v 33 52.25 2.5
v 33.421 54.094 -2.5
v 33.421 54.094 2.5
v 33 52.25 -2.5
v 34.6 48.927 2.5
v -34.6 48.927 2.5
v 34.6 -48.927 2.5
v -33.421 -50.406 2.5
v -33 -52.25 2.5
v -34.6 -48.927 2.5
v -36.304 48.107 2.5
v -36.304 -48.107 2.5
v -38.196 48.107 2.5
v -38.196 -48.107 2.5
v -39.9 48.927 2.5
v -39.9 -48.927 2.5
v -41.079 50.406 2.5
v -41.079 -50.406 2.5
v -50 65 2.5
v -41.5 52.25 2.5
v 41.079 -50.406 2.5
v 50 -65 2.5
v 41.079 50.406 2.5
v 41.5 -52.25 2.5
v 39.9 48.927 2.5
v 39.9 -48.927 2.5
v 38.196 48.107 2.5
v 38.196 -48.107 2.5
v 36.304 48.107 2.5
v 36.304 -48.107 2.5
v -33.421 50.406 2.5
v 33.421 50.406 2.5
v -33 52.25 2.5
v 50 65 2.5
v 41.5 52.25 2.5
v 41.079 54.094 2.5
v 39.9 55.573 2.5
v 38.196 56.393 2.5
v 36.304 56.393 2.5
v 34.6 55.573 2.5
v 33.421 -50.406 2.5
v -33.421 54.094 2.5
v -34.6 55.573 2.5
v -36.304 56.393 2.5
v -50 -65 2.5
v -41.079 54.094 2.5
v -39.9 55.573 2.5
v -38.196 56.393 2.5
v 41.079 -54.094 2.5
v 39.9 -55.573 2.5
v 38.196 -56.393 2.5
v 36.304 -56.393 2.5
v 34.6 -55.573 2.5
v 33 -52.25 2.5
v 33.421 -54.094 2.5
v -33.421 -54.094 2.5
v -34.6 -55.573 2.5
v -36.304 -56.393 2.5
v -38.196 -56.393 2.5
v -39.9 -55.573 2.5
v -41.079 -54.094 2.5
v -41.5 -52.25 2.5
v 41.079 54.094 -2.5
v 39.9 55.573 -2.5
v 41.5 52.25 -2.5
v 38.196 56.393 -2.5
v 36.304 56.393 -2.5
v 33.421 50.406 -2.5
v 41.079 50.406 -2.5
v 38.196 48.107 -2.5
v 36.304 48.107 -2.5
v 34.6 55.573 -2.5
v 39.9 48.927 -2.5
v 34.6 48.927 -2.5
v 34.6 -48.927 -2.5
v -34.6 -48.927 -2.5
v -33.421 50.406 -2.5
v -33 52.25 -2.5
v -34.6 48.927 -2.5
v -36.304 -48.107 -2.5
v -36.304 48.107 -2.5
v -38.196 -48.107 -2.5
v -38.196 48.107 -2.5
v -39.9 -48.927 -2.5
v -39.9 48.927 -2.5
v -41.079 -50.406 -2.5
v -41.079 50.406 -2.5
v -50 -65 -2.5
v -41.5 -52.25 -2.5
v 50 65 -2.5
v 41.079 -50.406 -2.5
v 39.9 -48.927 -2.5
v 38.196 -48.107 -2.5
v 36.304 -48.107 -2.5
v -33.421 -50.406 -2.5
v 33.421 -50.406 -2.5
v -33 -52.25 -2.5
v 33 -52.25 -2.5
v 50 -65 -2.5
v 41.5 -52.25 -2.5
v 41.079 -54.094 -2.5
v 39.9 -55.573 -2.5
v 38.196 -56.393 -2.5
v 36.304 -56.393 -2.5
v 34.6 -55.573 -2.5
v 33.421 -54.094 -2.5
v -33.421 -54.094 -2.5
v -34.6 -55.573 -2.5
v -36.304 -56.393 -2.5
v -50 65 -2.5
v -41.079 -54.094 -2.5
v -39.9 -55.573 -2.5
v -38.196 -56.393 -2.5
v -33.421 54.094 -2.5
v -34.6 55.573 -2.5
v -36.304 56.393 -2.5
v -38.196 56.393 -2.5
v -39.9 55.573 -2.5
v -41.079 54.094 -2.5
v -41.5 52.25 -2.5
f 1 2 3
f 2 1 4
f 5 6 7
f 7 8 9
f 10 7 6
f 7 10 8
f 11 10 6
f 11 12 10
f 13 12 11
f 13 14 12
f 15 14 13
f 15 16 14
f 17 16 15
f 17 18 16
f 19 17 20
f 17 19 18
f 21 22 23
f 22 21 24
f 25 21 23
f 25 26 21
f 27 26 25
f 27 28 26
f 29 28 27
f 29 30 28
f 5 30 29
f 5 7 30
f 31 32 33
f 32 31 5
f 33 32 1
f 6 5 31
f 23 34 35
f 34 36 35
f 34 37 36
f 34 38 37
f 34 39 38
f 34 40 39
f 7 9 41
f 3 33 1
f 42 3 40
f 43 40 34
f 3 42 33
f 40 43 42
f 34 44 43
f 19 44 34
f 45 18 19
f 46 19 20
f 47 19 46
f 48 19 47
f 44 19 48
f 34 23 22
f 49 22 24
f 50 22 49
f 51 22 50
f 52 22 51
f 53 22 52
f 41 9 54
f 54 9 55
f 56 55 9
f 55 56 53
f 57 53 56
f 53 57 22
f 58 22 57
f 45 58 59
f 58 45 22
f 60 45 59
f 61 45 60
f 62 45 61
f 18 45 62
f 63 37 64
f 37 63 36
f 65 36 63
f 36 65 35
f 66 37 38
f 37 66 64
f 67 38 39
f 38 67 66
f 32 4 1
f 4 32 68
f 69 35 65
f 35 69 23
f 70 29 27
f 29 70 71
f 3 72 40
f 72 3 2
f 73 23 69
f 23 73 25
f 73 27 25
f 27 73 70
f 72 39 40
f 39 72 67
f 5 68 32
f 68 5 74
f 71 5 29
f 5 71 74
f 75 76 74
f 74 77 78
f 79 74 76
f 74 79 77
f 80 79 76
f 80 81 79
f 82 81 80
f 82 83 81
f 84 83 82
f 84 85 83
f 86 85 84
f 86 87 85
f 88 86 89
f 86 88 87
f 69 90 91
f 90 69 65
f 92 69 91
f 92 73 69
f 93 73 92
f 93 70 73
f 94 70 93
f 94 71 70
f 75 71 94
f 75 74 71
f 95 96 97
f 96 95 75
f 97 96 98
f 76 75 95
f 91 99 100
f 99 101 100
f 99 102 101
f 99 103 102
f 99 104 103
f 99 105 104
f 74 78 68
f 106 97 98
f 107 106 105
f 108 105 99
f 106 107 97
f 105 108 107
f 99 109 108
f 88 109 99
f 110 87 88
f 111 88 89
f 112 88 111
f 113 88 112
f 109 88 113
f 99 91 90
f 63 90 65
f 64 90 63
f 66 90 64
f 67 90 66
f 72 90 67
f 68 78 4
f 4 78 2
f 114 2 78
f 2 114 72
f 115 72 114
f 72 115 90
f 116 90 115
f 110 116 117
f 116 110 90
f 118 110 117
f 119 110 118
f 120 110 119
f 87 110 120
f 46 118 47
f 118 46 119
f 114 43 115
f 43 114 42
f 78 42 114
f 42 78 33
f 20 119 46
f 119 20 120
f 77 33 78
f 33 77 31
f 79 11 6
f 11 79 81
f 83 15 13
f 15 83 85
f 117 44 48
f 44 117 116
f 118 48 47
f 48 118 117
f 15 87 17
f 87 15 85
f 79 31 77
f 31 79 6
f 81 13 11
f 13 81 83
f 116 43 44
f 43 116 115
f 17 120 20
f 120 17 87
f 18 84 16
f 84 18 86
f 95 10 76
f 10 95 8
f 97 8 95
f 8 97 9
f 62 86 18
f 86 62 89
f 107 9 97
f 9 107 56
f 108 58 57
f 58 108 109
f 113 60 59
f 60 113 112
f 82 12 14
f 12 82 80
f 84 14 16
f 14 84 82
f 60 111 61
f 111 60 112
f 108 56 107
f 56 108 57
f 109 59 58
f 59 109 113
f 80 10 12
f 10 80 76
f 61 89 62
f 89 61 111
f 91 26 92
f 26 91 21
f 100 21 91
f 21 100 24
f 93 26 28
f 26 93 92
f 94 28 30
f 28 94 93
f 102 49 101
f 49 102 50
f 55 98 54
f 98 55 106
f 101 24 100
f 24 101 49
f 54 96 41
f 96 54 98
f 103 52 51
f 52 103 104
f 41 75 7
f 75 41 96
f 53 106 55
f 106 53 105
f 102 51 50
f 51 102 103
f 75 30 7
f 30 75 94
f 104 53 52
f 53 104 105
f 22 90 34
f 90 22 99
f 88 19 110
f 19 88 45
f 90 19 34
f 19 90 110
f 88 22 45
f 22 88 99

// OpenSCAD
// Generated by SolidPython 1.1.3 on 2023-10-12 11:56:06


difference() {
	cube(center = true, size = [100, 130.0000000000, 5]);
	union() {
		translate(v = [37.2500000000, 52.2500000000]) {
			cylinder(center = true, h = 5, r = 4.2500000000);
		}
		translate(v = [-37.2500000000, 52.2500000000]) {
			cylinder(center = true, h = 5, r = 4.2500000000);
		}
		translate(v = [-37.2500000000, -52.2500000000]) {
			cylinder(center = true, h = 5, r = 4.2500000000);
		}
		translate(v = [37.2500000000, -52.2500000000]) {
			cylinder(center = true, h = 5, r = 4.2500000000);
		}
	}
}
/***********************************************
*********      SolidPython code:      **********
************************************************
 
import solid
import numbers
import pudb
from solid.utils import *
import viewscad
import subprocess
import os
import os.path as osp
import math
import sys

chamfer_extrude=solid.import_scad("./chamfer_extrude.scad")
chamfer_extrude=chamfer_extrude.chamfer_extrude
r = viewscad.Renderer(width=800, height=800)

def debug(model,f_name,path="/home/ts/code/projects/mfd/designs/debug"):
    solid.scad_render_to_file(model,osp.join(path,f_name)+".scad")
#generate position list of wells using offset from center
wells_pos_from_center_4 = lambda offset: [[-offset,offset],
                                        [offset, offset],
                                        [-offset, -offset],
                                        [offset, -offset]]
#wells_pos_from_center_2 = lambda offset: [[0,offset],
#                                        [0, -offset]]
wells_pos_from_center_2 = lambda offset: [[offset,0],
                                        [-offset,0]]

def make_well(dims,shape=None,height=None,dxf=False):
    def circle_cylinder():
        if dxf or (height is None):
            well = solid.circle(r=dims, segments=64)
        else:
            well = solid.cylinder(r=dims, h=height, segments=64, center = True)
        return well
    if dims is None:
        sys.exit("radius needs to be a number")
    if isinstance(dims, numbers.Number):
        well =circle_cylinder()
    elif len(dims)==1:
        if isinstance(dims[1], numbers.Number):
            well =circle_cylinder()
        else:
            sys.exit("radius needs to be a number")
    elif len(dims)==2:
        well = solid.square(dims,center = True)
    elif len(dims)==3:
        well = solid.cube(dims, center = True)
    return well

def wells_top_bottom(center_gap,device_dims=None,shape=None,height=None, positions = None, dxf = False):
    well_shape = make_well(device_dims,shape=shape,height=height,dxf=dxf)
    wells = []
    if positions is None:
        offset = radius+radius/2.0
        positions = wells_pos_from_center_2(offset)
    if dxf or (height is None):
        height = 0
    for position in positions:
        if dxf:
            wells.append(solid.translate([position[0],position[1]])(well_shape))
        else:
            wells.append(solid.translate([position[0],position[1],height/2.0])(well_shape))
    return  union()(*wells)

#place wells in four corners 
def four_corner(radius,height=None, positions = None, dxf = False):
    #if well pos not specified set
    #to equally spaced by half radius
    if positions is None:
        offset = radius+radius/2.0
        positions = wells_pos_from_center_4(offset)
    if dxf or (height is None):
        height = 0
    #make wells at positions with specified radius and height
    wells = []
    for position in positions:
        #make circle if making dxf
        if dxf:
            well_shape = solid.circle(r=radius, segments=64)
            well_shape = solid.translate([position[0],position[1]])(well_shape)
        #if stl make cylinder
        else:
            well_shape = solid.cylinder(r=radius, h=height, segments=64, center = True)
            well_shape = solid.translate([position[0],position[1],height/2.0])(well_shape)
        wells.append(well_shape)
    return  union()(*wells)

#generate channels 
def make_channels(length,width,height=0,num_chans=1,max_chans=None,spacing=None, dxf = False,
                  rotate_channels=False):
    if dxf or (height is None):
        height = 0
    #if channel gap not defined, is equal to
    if spacing is None: spacing = width
    #calculate number of channels if fitting max num within given width
    if not max_chans is None:
        import math
        num_chans = math.floor((max_chans-spacing)/(width+spacing))
    #get total width of channel section  
    total_width = (width*num_chans)+(spacing*(num_chans-1))

    #make template channel
    #if rotate_channels: width, length = length, width
    if dxf:
        channel_t = solid.square([length,width],center = True)
    else:
        channel_t = solid.cube([length,width,height], center = True)

    #if number channels is even, offset the first channel to center its gap
    if num_chans % 2 == 0: centering = -(width/2.0+spacing/2.0)
    else: centering = 0
    #move template channel up to align bottom at z = 0 
    #and offset center if necessary
    if dxf:
        channel_t = solid.translate([0,centering])(channel_t)
    else:
        channel_t = solid.translate([0,centering,height/2.0])(channel_t)

    #if rotate_channels: length,width = width,length
    #start making the channels
    channels = []
    for i in range(num_chans):
        #if i=0 there is no translation
        #if i=1, we make the first channel adjacent to second
        direction = i

        #if i>=1, we add channels alternating left and right
        if i >= 1:
            direction = -(i/2.0)
            if i % 2 == 1: direction = (-direction)+0.5
                
        #make channel at right position and add it to channel list
        translation_coords = [0,direction*(width+spacing)]
        #if rotate_channels: translation_coords = [direction*(width+spacing),0]
        if dxf:
            channel = solid.translate(translation_coords)(channel_t)
        else:
            channel = solid.translate([*translation_coords,0])(channel_t)
        channels.append(channel)
    
    #group all channels as one object
    channels = union()(*channels)
    #compute the x,y,z dimensions in order to pass as arguments 
    #for construction of other parts of device (such as the chambers)
    measurements = {'x':(length/2.0,-length/2.0),
                    'y':(total_width/2.0,-total_width/2.0)}
    if not dxf:
        measurements['z'] = (height,0)
    if rotate_channels:
        channels = solid.rotate(90)(channels)
        measurements['x'],measurements['y']=measurements['y'],measurements['x']
    return channels,measurements

def make_chambers(msrs,height=None,extra=0,len_until=None,width=None, dxf = False):
    #computes x,y,z length
    total = lambda x : abs(x[0]) + abs(x[1])
    
    #if specific height if specified
    #otherwise use same height as channels
    if dxf:
        pass
    elif not height is None:
        msrs['z'] = (height,0)
    else:
        msrs['z'] = (0,0)
        
    #make copy of measurements from channels to modify chamber dimensions 
    #and add length to chambers as specified
    chamber_dims = msrs.copy()
    #calculate length of chamber to reach specified offset
    if not len_until is None:
        chamber_len = len_until-(msrs['x'][0])
    #or add specified length to channel length (if not specified, adds 0)
    else:
        chamber_len = msrs['x'][0]+extra
    #set the chamber length based 
    chamber_dims['x'] = (chamber_len/2.0,-(chamber_len/2.0))
    #compute final dimensions of chamber
    if not width is None:
        chamber_dims['y'] = (width/2.0,-width/2.0)
    chamber_dims = [total(size) for size in chamber_dims.values()]
        
    #calculate chamber translation offset to place adjacent to channels
    chamber_trslt = msrs['x'][0]+(chamber_len/2.0)
    #compute chamber translation coordinates to align with channels
    #x = 1 moves chamber above channels
    #x = -1 moves chamber below channels
    if dxf:
        trslt = lambda x : [x*(chamber_trslt),0]
    else:
        trslt = lambda x : [x*(chamber_trslt),0,msrs['z'][0]/2.0]
    
    #function to make chamber at top or at bottom 
    if dxf:
        move = lambda x : solid.translate(trslt(x))(solid.square(chamber_dims, center = True) )
    else:
        move = lambda x : solid.translate(trslt(x))(solid.cube(chamber_dims,center = True))
    #make top and bottom chambers and return them as grouped
    top = move(1)
    bottom = move(-1)
    #chambers=solid.rotate(90)(solid.union()(top,bottom))
    chambers=(solid.union()(top,bottom))

    return chambers

#create alignment features 
def alignment_features(unit,dims,grid_size, mask_size = None, alignment = "hollow", units_from_center = (2.5,2.5), corner_len=None):
    width = grid_size[0]*dims[0]
    length = grid_size[1]*dims[1]
    if mask_size is None and corner_len is None:
        corner_len = (dims[0] + dims[1]) /2 / 8
    corner = lambda thickness_div : solid.union()( solid.square([corner_len,corner_len/thickness_div],center=False), solid.square([corner_len/thickness_div,corner_len],center=False) )
    
    def make_full(thickness_div):
        thickness = corner_len/thickness_div
        tr = solid.translate([0, 0, 0 ])(solid.rotate(180)(corner(thickness_div)))
        tr = solid.translate([thickness/2,thickness/2,0])(tr)
        bl = solid.translate([0, 0, 0 ])(solid.rotate(0)(corner(thickness_div)))
        bl = solid.translate([-thickness/2,-thickness/2,0])(bl)
        return solid.union()(tr,bl)
    
    def make_hollow(thickness_div):
        thickness = corner_len/(thickness_div/2)
        inner = make_full(thickness_div)
        outer = make_full(thickness_div/2)
        hollow = outer - inner 
        return hollow
    
    center = (width /2 , length/2)
    mask_pos = lambda x,y : (center[0] + x*(float(units_from_center[0])*dims[0]), center[1] + y*(float(units_from_center[1])*dims[1]))
    positions = []
    positions.append(mask_pos(1,0))
    positions.append(mask_pos(0,1))
    positions.append(mask_pos(-1,0))
    positions.append(mask_pos(0,-1))
    make_mask = lambda mtype : make_hollow(8) if mtype == "hollow" else make_full(8)
    masks = [ solid.translate([*position,0])(make_mask(alignment)) for position in positions]
    
    solid.scad_render_to_file(solid.union()(*masks),"./designs/open_chamber/masks.scad")
    #return unit - solid.union()(*masks)
    return solid.union()(*masks,unit)

def create_outline(thickness, array, dims, grid_size,):
    width = grid_size[0]*dims[0] + thickness *2
    length = grid_size[1]*dims[1] + thickness *2
    outer = solid.translate([-thickness, -thickness,0])(solid.square([width, length]))
    return outer-array

def create_wall(wall_thickness, outline_thickness, dims, grid_size, wall_height = 2000, dxf = False):
    inner_width = grid_size[0]*dims[0] + outline_thickness *2
    inner_length = grid_size[1]*dims[1] + outline_thickness *2
    outer_width = inner_width + wall_thickness * 2
    outer_length = inner_length + wall_thickness * 2
    outer_pos_x = -outline_thickness-wall_thickness
    outer_pos_y = -outline_thickness-wall_thickness
    inner_pos_x = -outline_thickness
    inner_pos_y = -outline_thickness
    if dxf:
        inner_wall = solid.translate([inner_pos_x,
                                      inner_pos_y,
                                      0])(solid.square([inner_width, inner_length]))
        outer_wall = solid.translate([outer_pos_x,
                                      outer_pos_y,
                                      0])(solid.square([outer_width, outer_length]))

        return outer_wall-inner_wall
    else:
        inner_wall = solid.translate([inner_pos_x,
                                      inner_pos_y,
                                      0])(solid.cube([inner_width, inner_length,wall_height]))
        outer_wall = solid.translate([outer_pos_x,
                                      outer_pos_y,
                                      0])(solid.cube([outer_width, outer_length,wall_height]))

        return outer_wall-inner_wall, {'wall_height': wall_height,
                                       'wall_thickness': wall_thickness,
                                       'inner_width':inner_width,
                                       'inner_length': inner_length,
                                       'outer_width': outer_width,
                                       'outer_length': outer_length,
                                       'outer_pos_x' : outer_pos_x,
                                       'outer_pos_y' : outer_pos_y,
                                       'inner_pos_x' : inner_pos_x,
                                       'inner_pos_y' : inner_pos_y}

def create_thicker_wall(wall_thickness, outer_wall_offset, wall_dims, dims, grid_size, height_start = .2, height_end=2, dxf = False):
    addon_wall,thicker_wall_dims = create_wall(wall_thickness, outer_wall_offset, dims, grid_size, wall_height=height_end-height_start, dxf = False)
    addon_wall = solid.translate([0,0,height_start])(addon_wall)

    thicker_wall_dims['wall_height'] = height_end
    thicker_wall_dims['wall_thickness'] = wall_dims['wall_thickness'] + wall_thickness
    return addon_wall, thicker_wall_dims
 
def add_lock_to_wall(wall,wall_dims,y_offset = 0,cut_ratio=0.7,L_length=3, gap_ratio=0.05, axis="x",width_ratio=1/2):
    # Makes L shape
    def make_L(max_length,length_thickness,max_width,width_thickness,height,y_offset):
        length = solid.cube([max_length,length_thickness,height])
        width = solid.cube([width_thickness,max_width,height])
        width = solid.translate([max_length-(width_thickness),0,0])(width)
        L = solid.union()(width,length)
        debug(L,"L")
        if axis == "x":
            L = solid.rotate(-90)(L)
            L = solid.translate([0,max_length,0])(L)
        else:
            L = solid.rotate(-180)(L)
            L = solid.translate([max_length,max_width,0])(L)
        return solid.translate([0,0,y_offset])(L)
    
    lock_length = L_length
    lock_width = wall_dims['wall_thickness']*width_ratio
    lock_length_thickness = lock_width/2
    lock_width_thickness = lock_width/2
    L_lock = make_L(lock_length,lock_length_thickness,lock_width,lock_width_thickness, wall_dims['wall_height']-y_offset, y_offset)
    
    margin_space = lock_length - lock_length*(1-gap_ratio)
    key_length = lock_length-margin_space
    key_length_thickness = lock_length_thickness-(margin_space*2)
    key_width = lock_width-(margin_space*2)
    key_width_thickness = lock_width_thickness-(margin_space*2)
    L_key = make_L(key_length,key_length_thickness,key_width,key_width_thickness, wall_dims['wall_height']-y_offset, y_offset)
    L_key = solid.translate([margin_space,margin_space,0])(L_key)
    L = solid.union()(L_lock,L_key)
    debug(L,"L")
    
    #Make cube to be used as negative to split frame in a half
    #Can choose if making left or right negative, specify ratio of split
    def make_negative(right,cut_ratio):
        if axis == "x":
            if right:
                length = wall_dims['outer_length']*(1-cut_ratio)
                pos_x = wall_dims['outer_pos_x']+(wall_dims['outer_length']*cut_ratio)
            else:
                length = wall_dims['outer_length']*(cut_ratio)
                pos_x = wall_dims['outer_pos_x'] 
            negative = solid.cube([wall_dims['outer_width'],length, wall_dims['wall_height']])
            negative = solid.translate([wall_dims['outer_pos_y'],pos_x,0])(negative)
        else:
            if right:
                length = wall_dims['outer_width']*(1-cut_ratio)
                pos_x = wall_dims['outer_pos_y']+(wall_dims['outer_width']*cut_ratio)
            else:
                length = wall_dims['outer_width']*(cut_ratio)
                pos_x = wall_dims['outer_pos_y'] 
            negative = solid.cube([length,wall_dims['outer_length'], wall_dims['wall_height']])
            negative = solid.translate([pos_x,wall_dims['outer_pos_x'],0])(negative)
        return negative, pos_x, length 
                      
    #Make negatives
    negative_right, right_half_pos_x, right_half_length = make_negative(True,cut_ratio)
    negative_left, left_half_pos_x, right_half_length = make_negative(False,cut_ratio)
    #Make halves
    left_half = solid.difference()(wall,negative_right)
    right_half = solid.difference()(wall,negative_left)
    def place_L(L, L_length,L_width):
        #Place L on top wall       
        offset_to_center = (wall_dims['wall_thickness']-L_width)/2
        if axis == "x":
            y_pos_top = (wall_dims['outer_pos_y'] +
                    wall_dims['outer_width'] - 
                    L_width - offset_to_center)
            top_L = solid.translate([y_pos_top,
                                     right_half_pos_x-(L_length),
                                     0])(L)
            #Place L on bottom wall       
            y_pos_bottom = wall_dims['outer_pos_y']+offset_to_center
            bottom_L = solid.translate([y_pos_bottom,
                                        right_half_pos_x-L_length,
                                        0])(L)
        else:
            y_pos_top = (wall_dims['outer_pos_x'] +
                    wall_dims['outer_length'] -
                    (L_width+offset_to_center))
            top_L = solid.translate([right_half_pos_x-L_length,
                                     y_pos_top,
                                     0])(L)
            #Place L on bottom wall       
            y_pos_bottom = wall_dims['outer_pos_y']+offset_to_center
            bottom_L = solid.translate([right_half_pos_x-L_length,
                                        y_pos_bottom,
                                        0])(L)
        return bottom_L, top_L
    #Make complimentary L pieces through union and differences
    #Make Lock
    bottom_L_lock, top_L_lock = place_L(L_lock,L_length,lock_width)
    left_half = solid.difference()(left_half,bottom_L_lock)
    left_half = solid.difference()(left_half,top_L_lock)
    #Make Key
    bottom_L_key, top_L_key = place_L(L_key,L_length,lock_width)
    right_half = solid.union()(right_half,bottom_L_key)
    right_half = solid.union()(right_half,top_L_key)
    return left_half, right_half


#build a row x col grid of containment units
def make_unit_array(unit,dims,grid_size, dxf = False, alignment = None, mask_size = None,
                    units_from_center = None,alignment_offset=None, alignment_mark_size=1):
    units = []
    for col in range(grid_size[1]):
        for row in range(grid_size[0]):
            if dxf:
                units.append(solid.translate([row*dims[0],col*dims[1]])(unit))
            else:
                units.append(solid.translate([row*dims[0],col*dims[1],dims[2]/2.0])(unit))
    array = solid.union()(*units)
    if (not alignment is None) and dxf:
        if not alignment_offset is None:
            array = solid.translate([alignment_offset[0],alignment_offset[1]])(array)
        array = alignment_features(array,dims, grid_size, alignment = alignment, mask_size = None, units_from_center = units_from_center,corner_len=alignment_mark_size)
        if not alignment_offset is None:
            array = solid.translate([-alignment_offset[0],-alignment_offset[1]])(array)
    return array


def make_taylor(wells_pos = wells_pos_from_center_4(2.25), well_rad = 1.5 ,
                well_height = 2, chan_w = 0.01, chan_l = 1, chan_h = 0.010 ,
                chan_gap = 0.040, max_chans = None,num_chans=100, chamber_height  = 0.100,
                columns = 1, rows = 1, chamber_len_until=2.25, add_channels = True, add_wells = True, 
                add_chambers = True, save_path = "./", alignment = None, units_from_center = 2,
                mask_size = None, render_stl = False, outline_thickness = 0.050, dxf = True,
                wall_height = 15, wall_thickness = 0.95, casing_x=9, casing_y=9, casing_z=0,rotate_units=0):

    dims = [casing_x, casing_y, casing_z]
    wells = four_corner(well_rad,well_height, dxf = dxf, positions = wells_pos)
    debug(wells,"wells")
    channels, msrs = make_channels(chan_l,chan_w,chan_h,dxf=dxf, spacing = chan_gap, max_chans=max_chans,num_chans=num_chans)
    debug(channels,"channels")
    chambers = make_chambers(msrs,dxf = dxf, height=chamber_height,len_until=chamber_len_until)
    debug(chambers,"chambers")

    #add together and render
    device_parts = []
    if add_channels:
        device_parts.append(channels)
    if add_wells:
        device_parts.append(wells)
    if add_chambers:
        device_parts.append(chambers)
    device=union()(*device_parts)
    device = rotate(rotate_units)(device)

    device=solid.translate([dims[0]/2.0,dims[1]/2.0,0])(device)
    channels = rotate(rotate_units)(channels)
    channels=solid.translate([dims[0]/2,dims[1]/2,0])(channels)
    chambers_wells = union()(wells,chambers)
    chambers_wells = rotate(rotate_units)(chambers_wells)
    chambers_wells=solid.translate([dims[0]/2,dims[1]/2,0])(chambers_wells)

    file_name = str(rows)+'x'+str(columns)+'_units_'
    grid_size = [rows,columns]

    if alignment:
        alignment="full"
    device = make_unit_array(device,dims,grid_size, dxf=dxf, alignment = alignment,
                                 units_from_center = units_from_center)
    channels = make_unit_array(channels,dims,grid_size, dxf=dxf, alignment = alignment,
                                 units_from_center = units_from_center)
    if alignment=="full":
        alignment="hollow"

    chambers_wells = make_unit_array(chambers_wells,dims,grid_size, dxf=dxf, alignment = alignment,
                                 units_from_center =units_from_center)

    def save_model(model,prefix):
        model_fname = os.path.abspath(save_path+prefix+"_"+file_name+".scad")
        solid.scad_render_to_file(model,model_fname)
        return model_fname

    wells_fname = save_model(wells,"wells")
    channels_fname = save_model(channels,"channels")
    device_fname = save_model(device,"device")
    chambers_wells_fname = save_model(chambers_wells,"chambers_wells")
    return (chambers_wells,chambers_wells_fname), (channels,channels_fname), (device,device_fname)

def make_device(design='open',rows=8,columns=6,wells_pos = 4.5,well_offset=3.2, well_rad=3.2,well_height=0.1,
                chan_l=1,chan_w=0.01,chan_h=0.01,chan_gap=0.015,num_chans=101,dxf=True,save_path="./designs/open_chamber/",
                casing_x=9.0,casing_y=18.0,casing_z=0,rotate_units=90,units_from_center=(3,1),chamber_len_until=4.5,
                chamber_width=None,alignment=True, add_wells=True, add_channels=True,add_chambers=True):

    dims = [casing_x, casing_y, casing_z]
    if design == "open":
        wells_pos=wells_pos_from_center_2(wells_pos)
        wells = wells_top_bottom(well_offset*2,device_dims=well_rad,height=well_height, dxf = dxf, positions = wells_pos)
    elif design == "closed":
        wells_pos=wells_pos_from_center_4(wells_pos)
        debug(wells,"wells")
        wells = four_corner(well_offset,well_heightdevice_dims=well_rad, dxf = dxf, positions = wells_pos)
    else:
        print(design+" is not a valid design.\n Choose valid design: 'open' or 'closed'")
        exit()
    wells = rotate(rotate_units)(wells)
    wells=solid.translate([dims[0]/2,dims[1]/2,0])(wells)
    debug(wells,"wells")

    channels, msrs = make_channels(chan_l,chan_w,chan_h,dxf=dxf, spacing = chan_gap, num_chans=num_chans,rotate_channels=False)
    channels = rotate(rotate_units)(channels)
    channels=solid.translate([dims[0]/2,dims[1]/2,0])(channels)

    chambers=make_chambers(msrs,height=None,extra=0,len_until=chamber_len_until, width=chamber_width,dxf = dxf)
    chambers = rotate(rotate_units)(chambers)
    chambers=solid.translate([dims[0]/2,dims[1]/2,0])(chambers)

    device_parts = []
    if add_channels:
        device_parts.append(channels)
    if add_wells:
        device_parts.append(wells)
    if add_chambers:
        device_parts.append(chambers)
    device = union()(*device_parts)
    #device = rotate(rotate_units)(device)
    #device=solid.translate([dims[0]/2.0,dims[1]/2.0,0])(device)

    chambers_wells = []
    if add_chambers:
        chambers_wells.append(chambers)
    if add_wells:
        chambers_wells.append(wells)
    chambers_wells = union()(*chambers_wells)
    #chambers_wells = union()(wells,chambers)
    #chambers_wells = rotate(rotate_units)(chambers_wells)
    #chambers_wells=solid.translate([dims[0]/2,dims[1]/2,0])(chambers_wells)

    file_name = str(rows)+'x'+str(columns)+'_units_'

    grid_size = [rows,columns]
    if alignment:
        alignment="full"
    device = make_unit_array(device,dims,grid_size, dxf=dxf, alignment = alignment,
                                 units_from_center = units_from_center)
    channels = make_unit_array(channels,dims,grid_size, dxf=dxf, alignment = alignment,
                                 units_from_center = units_from_center)
    if alignment=="full":
        alignment="hollow"

    chambers_wells = make_unit_array(chambers_wells,dims,grid_size, dxf=dxf, alignment = alignment,
                                 units_from_center =units_from_center)

    def save_model(model,prefix):
        model_fname = os.path.abspath(save_path+prefix+"_"+file_name+".scad")
        solid.scad_render_to_file(model,model_fname)
        return model_fname

    wells_fname = save_model(wells,"wells")
    channels_fname = save_model(channels,"channels")
    device_fname = save_model(device,"device")
    chambers_wells_fname = save_model(chambers_wells,"chambers_wells")
    return (chambers_wells,chambers_wells_fname), (channels,channels_fname), (device,device_fname)


def make_open_chamber(rows=8,columns=6,wells_pos = wells_pos_from_center_2(4.5), well_rad=3.2,well_height=0.1,
                      chan_l=1,chan_w=0.01,chan_h=0.01,chan_gap=0.015,num_chans=101,dxf=True,save_path="./designs/open_chamber/",
                      casing_x=9.0,casing_y=18.0,casing_z=0,rotate_units=90,units_from_center=(3,1),chamber_len_until=4.5,
                      chamber_width=None,alignment=True, add_wells=True, add_channels=True,add_chambers=True):

    dims = [casing_x, casing_y, casing_z]
    wells = wells_top_bottom(well_rad,height=well_height, dxf = dxf, positions = wells_pos)
    channels, msrs = make_channels(chan_l,chan_w,chan_h,dxf=dxf, spacing = chan_gap, num_chans=num_chans,rotate_channels=False)
    chambers=make_chambers(msrs,height=None,extra=0,len_until=chamber_len_until, width=chamber_width,dxf = dxf)
    debug(chambers,"chambers")
    device_parts = []
    if add_channels:
        device_parts.append(channels)
    if add_wells:
        device_parts.append(wells)
    if add_chambers:
        device_parts.append(chambers)
    device = union()(*device_parts)
    device = rotate(rotate_units)(device)
    device=solid.translate([dims[0]/2.0,dims[1]/2.0,0])(device)
    channels = rotate(rotate_units)(channels)
    channels=solid.translate([dims[0]/2,dims[1]/2,0])(channels)
    chambers_wells = union()(wells,chambers)
    chambers_wells = rotate(rotate_units)(chambers_wells)
    chambers_wells=solid.translate([dims[0]/2,dims[1]/2,0])(chambers_wells)

    file_name = str(rows)+'x'+str(columns)+'_units_'

    grid_size = [rows,columns]
    if alignment:
        alignment="full"
    device = make_unit_array(device,dims,grid_size, dxf=dxf, alignment = alignment,
                                 units_from_center = units_from_center)
    channels = make_unit_array(channels,dims,grid_size, dxf=dxf, alignment = alignment,
                                 units_from_center = units_from_center)
    if alignment=="full":
        alignment="hollow"

    chambers_wells = make_unit_array(chambers_wells,dims,grid_size, dxf=dxf, alignment = alignment,
                                 units_from_center =units_from_center)

    def save_model(model,prefix):
        model_fname = os.path.abspath(save_path+prefix+"_"+file_name+".scad")
        solid.scad_render_to_file(model,model_fname)
        return model_fname

    wells_fname = save_model(wells,"wells")
    channels_fname = save_model(channels,"channels")
    device_fname = save_model(device,"device")
    chambers_wells_fname = save_model(chambers_wells,"chambers_wells")
    return (chambers_wells,chambers_wells_fname), (channels,channels_fname), (device,device_fname)

def to_dxf(scad_path):
    dxf_path = scad_path.replace(".scad",".dxf")
    subprocess.call(["openscad", "-o", dxf_path, scad_path])
    import ezdxf
    temp_dxf = ezdxf.readfile(dxf_path)
    temp_dxf.saveas(dxf_path)

#def make_walls(diameter,thickness,grid_size,dims,height=20,segments=256,make_inner=True):
#    wafer_wall_out = solid.cylinder(r=diameter/2,h=height, segments=segments)
#    wafer_wall_in = solid.cylinder(r=(diameter/2-thickness),h=height, segments=segments)
#    wafer_wall = solid.difference()(wafer_wall_out,wafer_wall_in)
#    wafer_wall = solid.translate([grid_size[1]*dims[1]/2.0,grid_size[0]*dims[0]/2.0])(wafer_wall)
#
#    vertical_wall_length = grid_size[1]*dims[1]
#    horizontal_wall_length = grid_size[0]*dims[0]
#    vertical_wall = solid.cube([vertical_wall_length,thickness,height],center = True)
#    vertical_wall = solid.translate([vertical_wall_length/2,0,height/2])(vertical_wall)
#    horizontal_wall = solid.cube([thickness,horizontal_wall_length,height],center = True)
#    horizontal_wall = solid.translate([0,vertical_wall_length/2,height/2])(horizontal_wall)
#    walls = []
#    walls.append(horizontal_wall)
#    walls.append(vertical_wall)
#    for col in range(grid_size[1]):
#        if col == grid_size[1]-1: 
#            walls.append(solid.translate([0,(col+1)*dims[1]])(vertical_wall))
#        elif col > 0 and col < grid_size[1]-1 and make_inner==True:
#            walls.append(solid.translate([0,(col+1)*dims[1]])(vertical_wall))
#    for row in range(grid_size[0]):
#        if row == grid_size[0]-1: 
#            walls.append(solid.translate([(row+1)*dims[0],0])(horizontal_wall))
#        elif row > 0 and row < grid_size[0]-1 and make_inner==True:
#            walls.append(solid.translate([(row+1)*dims[0],0])(horizontal_wall))
#    walls = union()(*walls)
#    wafer_walls = union()(walls,wafer_wall)
#    return walls,wafer_wall,wafer_walls

def make_walls(diameter,thickness,grid_size,dims,height=20,segments=256,make_inner=True,padx=0,pady=0):
    wafer_wall_out = solid.cylinder(r=diameter/2,h=height, segments=segments)
    wafer_wall_in = solid.cylinder(r=(diameter/2-thickness),h=height, segments=segments)
    wafer_wall = solid.difference()(wafer_wall_out,wafer_wall_in)
    wafer_wall = solid.translate([grid_size[1]*dims[1]/2.0,grid_size[0]*dims[0]/2.0])(wafer_wall)

    vertical_wall_length = grid_size[0]*dims[0]+padx
    horizontal_wall_length = grid_size[1]*dims[1]+pady
    vertical_wall = solid.cube([vertical_wall_length,thickness,height],center = True)
    vertical_wall = solid.translate([vertical_wall_length/2-pady/2,-padx/2,height/2])(vertical_wall)
    horizontal_wall = solid.cube([thickness,horizontal_wall_length,height],center = True)
    horizontal_wall = solid.translate([-pady/2,horizontal_wall_length/2-padx/2,height/2])(horizontal_wall)
    walls = []
    walls.append(horizontal_wall)
    walls.append(vertical_wall)
    for col in range(grid_size[1]):
        if col == grid_size[1]-1: 
            walls.append(solid.translate([0,(col+1)*dims[1]+pady])(vertical_wall))
        elif col > 0 and col < grid_size[1]-1 and make_inner==True:
            walls.append(solid.translate([0,(col+1)*dims[1]])(vertical_wall))
    for row in range(grid_size[0]):
        if row == grid_size[0]-1: 
            walls.append(solid.translate([(row+1)*dims[0]+padx,0])(horizontal_wall))
        elif row > 0 and row < grid_size[0]-1 and make_inner==True:
            walls.append(solid.translate([(row+1)*dims[0],0])(horizontal_wall))
    walls = union()(*walls)
    wafer_walls = union()(walls,wafer_wall)
    return walls,wafer_wall,wafer_walls

def save_model(model,base_path,base_name,dxf=True):
    if not os.path.exists(base_path):
        os.makedirs(base_path)
    dxf_path=osp.join(base_path,base_name+".scad")
    solid.scad_render_to_file(model,osp.join(dxf_path))
    if dxf:
        to_dxf(dxf_path)

def make_wafer(diameter,flat_len,thickness):
    wafer = solid.cylinder(r1=diameter/2,r2=diameter/2,h=thickness,segments=512,)()
    x_start_flat=(flat_len/2)
    y_start_flat = math.sqrt(((diameter/2)**2) - (x_start_flat**2) )
    height_delete_flat=diameter/2-y_start_flat
    flat_delete = solid.cube([flat_len,height_delete_flat,thickness],center=False)()
    flat_delete = solid.translate([-flat_len/2,y_start_flat,0])(flat_delete)
    wafer = solid.difference()(wafer,flat_delete)
    wafer = solid.rotate(90)(wafer)
    return wafer

def add_wafer_to_mask(wafer_size,flat_len,mask,grid_size,dims,wafer_line_thickness=0.1,outer_mask_thickness=5,alignment_offset=None):
    def make_wafer_mask(wafer_size,flat_len):
        wafer_mask = make_wafer(wafer_size,flat_len,1)
        wafer_mask = solid.projection()(wafer_mask)
        wafer_mask = solid.translate([grid_size[0]*dims[0]/2.0,grid_size[1]*dims[1]/2.0])(wafer_mask)
        if not alignment_offset is None:
            wafer_mask = solid.translate([-alignment_offset[0],-alignment_offset[1]])(wafer_mask)
        return wafer_mask

    inner_wafer_line_mask = make_wafer_mask(wafer_size-wafer_line_thickness/2,flat_len)
    outer_wafer_line_mask = make_wafer_mask(wafer_size+wafer_line_thickness/2,flat_len)
    outer_wafer_mask = make_wafer_mask(wafer_size+outer_mask_thickness,flat_len)
    outer_wafer_mask = solid.difference()(outer_wafer_mask,outer_wafer_line_mask)
    wafer_mask = solid.union()(outer_wafer_mask,inner_wafer_line_mask)

    return solid.difference()(wafer_mask,mask)

def make_posts(post_shape,post_height):
    posts = solid.linear_extrude(height=post_height)(post_shape)
    return posts

def make_wafer_empty(diameter,flat_len,thickness,margin,notch_len=20,notch_height=5,oversize=1.01):
    diameter*=oversize
    flat_len*=oversize
    wafer = make_wafer(diameter,flat_len,thickness)
    holder = solid.cylinder(r1=diameter/2+margin,r2=diameter/2+margin,h=thickness,segments=512)()
    holder = solid.difference()(holder,wafer)

    x_start_flat=(flat_len/2)
    y_start_flat = math.sqrt(((diameter/2)**2) - (x_start_flat**2) )
    height_delete_flat=diameter/2-y_start_flat
    notch = solid.cube([notch_len,notch_height,thickness],center=False)()
    notch = solid.translate([-notch_len/2,y_start_flat,0])(notch)
    notch = solid.rotate(90)(notch)
    return solid.difference()(holder,notch)

def wafer_print_calibration(diameter,thickness,height,z_offset):
    circles = []
    radii = []
    radii.append(diameter/2.0*0.8)
    radii.append(diameter/2.0*0.6)
    radii.append(diameter/2.0*0.4)
    radii.append(diameter/2.0*0.2)
    for radius in radii:
        inner = solid.cylinder(r1=radius-(thickness/2.0),r2=radius-(thickness/2.0),h=thickness,segments=512,)()
        outer = solid.cylinder(r1=radius+(thickness/2.0),r2=radius+(thickness/2.0),h=thickness,segments=512,)()
        diff = solid.difference()(outer,inner)
        circles.append(diff)
    circles = solid.union()(*circles)
    circles = solid.translate([0,0,z_offset])(circles)
    return circles

def make_rack(wells,dims,grid_size,alignment_offset,rack_x,rack_y,rack_thickness,bolt_width,add_bolts=True):

    #get X and Y dimensions of gride of pipette tips
    X_len = dims[0]*grid_size[0]
    Y_len = dims[1]*grid_size[1]
    #make rack
    rack = solid.cube([rack_x,rack_y,rack_thickness],center=True)

    if add_bolts:
    #add bolt holes
        bolt_hole=solid.cylinder(r=bolt_width/2,h=rack_thickness,center=True)()
        bolt_holes = []
        bolt_holes.append(solid.translate([rack_x/2-1.5*bolt_width,rack_y/2-1.5*bolt_width])(bolt_hole))
        bolt_holes.append(solid.translate([-rack_x/2+1.5*bolt_width,rack_y/2-1.5*bolt_width])(bolt_hole))
        bolt_holes.append(solid.translate([-rack_x/2+1.5*bolt_width,-rack_y/2+1.5*bolt_width])(bolt_hole))
        bolt_holes.append(solid.translate([rack_x/2-1.5*bolt_width,-rack_y/2+1.5*bolt_width])(bolt_hole))
        bolt_holes = solid.union()(*bolt_holes)
        rack=solid.difference()(rack,bolt_holes)
    rack_support = rack

    #center rack with pipette holes
    rack = solid.translate([0,0,rack_thickness/2])(rack)
    rack = solid.translate([X_len/2,Y_len/2])(rack)
    rack = solid.translate([-alignment_offset[0],-alignment_offset[1]])(rack)
    wells = solid.linear_extrude(height=rack_thickness)(wells)
    rack = solid.difference()(rack,wells)
    return rack, rack_support

def make_pillar(wells,dims,grid_size,alignment_offset,rack_x,rack_y,pillar_height,rack_thickness,bolt_width,add_bolts=True,taper_angle=1,bolt_position_corner=1.5):

    #get X and Y dimensions of gride of pipette tips
    X_len = dims[0]*grid_size[0]
    Y_len = dims[1]*grid_size[1]
    #make rack
    rack = solid.cube([rack_x,rack_y,rack_thickness],center=True)
    
    if add_bolts:
    #add bolt holes
        bolt_hole=solid.cylinder(r=bolt_width/2,h=rack_thickness,center=True)()
        bolt_holes = []
        bolt_holes.append(solid.translate([rack_x/2-bolt_position_corner*bolt_width,rack_y/2-bolt_position_corner*bolt_width])(bolt_hole))
        bolt_holes.append(solid.translate([-rack_x/2+bolt_position_corner*bolt_width,rack_y/2-bolt_position_corner*bolt_width])(bolt_hole))
        bolt_holes.append(solid.translate([-rack_x/2+bolt_position_corner*bolt_width,-rack_y/2+bolt_position_corner*bolt_width])(bolt_hole))
        bolt_holes.append(solid.translate([rack_x/2-bolt_position_corner*bolt_width,-rack_y/2+bolt_position_corner*bolt_width])(bolt_hole))
        bolt_holes = solid.union()(*bolt_holes)
        rack=solid.difference()(rack,bolt_holes)
    rack_support = rack

    #center rack with pipette holes
    #rack = solid.translate([0,0,-rack_thickness])(rack)
    rack = solid.translate([X_len/2,Y_len/2])(rack)
    rack = solid.translate([-alignment_offset[0],-alignment_offset[1]])(rack)
    if not taper_angle == 0:
        wells=chamfer_extrude(pillar_height,taper_angle,segments=20)(wells)
    else:
        wells = solid.linear_extrude(height=pillar_height)(wells)
    rack = solid.union()(rack,wells)
    return rack, rack_support

def deg_taper_len(height,deg):
    if not deg == 0:
        return height*math.tan(math.radians(deg))
    else:
        return 0









 
 
************************************************/
